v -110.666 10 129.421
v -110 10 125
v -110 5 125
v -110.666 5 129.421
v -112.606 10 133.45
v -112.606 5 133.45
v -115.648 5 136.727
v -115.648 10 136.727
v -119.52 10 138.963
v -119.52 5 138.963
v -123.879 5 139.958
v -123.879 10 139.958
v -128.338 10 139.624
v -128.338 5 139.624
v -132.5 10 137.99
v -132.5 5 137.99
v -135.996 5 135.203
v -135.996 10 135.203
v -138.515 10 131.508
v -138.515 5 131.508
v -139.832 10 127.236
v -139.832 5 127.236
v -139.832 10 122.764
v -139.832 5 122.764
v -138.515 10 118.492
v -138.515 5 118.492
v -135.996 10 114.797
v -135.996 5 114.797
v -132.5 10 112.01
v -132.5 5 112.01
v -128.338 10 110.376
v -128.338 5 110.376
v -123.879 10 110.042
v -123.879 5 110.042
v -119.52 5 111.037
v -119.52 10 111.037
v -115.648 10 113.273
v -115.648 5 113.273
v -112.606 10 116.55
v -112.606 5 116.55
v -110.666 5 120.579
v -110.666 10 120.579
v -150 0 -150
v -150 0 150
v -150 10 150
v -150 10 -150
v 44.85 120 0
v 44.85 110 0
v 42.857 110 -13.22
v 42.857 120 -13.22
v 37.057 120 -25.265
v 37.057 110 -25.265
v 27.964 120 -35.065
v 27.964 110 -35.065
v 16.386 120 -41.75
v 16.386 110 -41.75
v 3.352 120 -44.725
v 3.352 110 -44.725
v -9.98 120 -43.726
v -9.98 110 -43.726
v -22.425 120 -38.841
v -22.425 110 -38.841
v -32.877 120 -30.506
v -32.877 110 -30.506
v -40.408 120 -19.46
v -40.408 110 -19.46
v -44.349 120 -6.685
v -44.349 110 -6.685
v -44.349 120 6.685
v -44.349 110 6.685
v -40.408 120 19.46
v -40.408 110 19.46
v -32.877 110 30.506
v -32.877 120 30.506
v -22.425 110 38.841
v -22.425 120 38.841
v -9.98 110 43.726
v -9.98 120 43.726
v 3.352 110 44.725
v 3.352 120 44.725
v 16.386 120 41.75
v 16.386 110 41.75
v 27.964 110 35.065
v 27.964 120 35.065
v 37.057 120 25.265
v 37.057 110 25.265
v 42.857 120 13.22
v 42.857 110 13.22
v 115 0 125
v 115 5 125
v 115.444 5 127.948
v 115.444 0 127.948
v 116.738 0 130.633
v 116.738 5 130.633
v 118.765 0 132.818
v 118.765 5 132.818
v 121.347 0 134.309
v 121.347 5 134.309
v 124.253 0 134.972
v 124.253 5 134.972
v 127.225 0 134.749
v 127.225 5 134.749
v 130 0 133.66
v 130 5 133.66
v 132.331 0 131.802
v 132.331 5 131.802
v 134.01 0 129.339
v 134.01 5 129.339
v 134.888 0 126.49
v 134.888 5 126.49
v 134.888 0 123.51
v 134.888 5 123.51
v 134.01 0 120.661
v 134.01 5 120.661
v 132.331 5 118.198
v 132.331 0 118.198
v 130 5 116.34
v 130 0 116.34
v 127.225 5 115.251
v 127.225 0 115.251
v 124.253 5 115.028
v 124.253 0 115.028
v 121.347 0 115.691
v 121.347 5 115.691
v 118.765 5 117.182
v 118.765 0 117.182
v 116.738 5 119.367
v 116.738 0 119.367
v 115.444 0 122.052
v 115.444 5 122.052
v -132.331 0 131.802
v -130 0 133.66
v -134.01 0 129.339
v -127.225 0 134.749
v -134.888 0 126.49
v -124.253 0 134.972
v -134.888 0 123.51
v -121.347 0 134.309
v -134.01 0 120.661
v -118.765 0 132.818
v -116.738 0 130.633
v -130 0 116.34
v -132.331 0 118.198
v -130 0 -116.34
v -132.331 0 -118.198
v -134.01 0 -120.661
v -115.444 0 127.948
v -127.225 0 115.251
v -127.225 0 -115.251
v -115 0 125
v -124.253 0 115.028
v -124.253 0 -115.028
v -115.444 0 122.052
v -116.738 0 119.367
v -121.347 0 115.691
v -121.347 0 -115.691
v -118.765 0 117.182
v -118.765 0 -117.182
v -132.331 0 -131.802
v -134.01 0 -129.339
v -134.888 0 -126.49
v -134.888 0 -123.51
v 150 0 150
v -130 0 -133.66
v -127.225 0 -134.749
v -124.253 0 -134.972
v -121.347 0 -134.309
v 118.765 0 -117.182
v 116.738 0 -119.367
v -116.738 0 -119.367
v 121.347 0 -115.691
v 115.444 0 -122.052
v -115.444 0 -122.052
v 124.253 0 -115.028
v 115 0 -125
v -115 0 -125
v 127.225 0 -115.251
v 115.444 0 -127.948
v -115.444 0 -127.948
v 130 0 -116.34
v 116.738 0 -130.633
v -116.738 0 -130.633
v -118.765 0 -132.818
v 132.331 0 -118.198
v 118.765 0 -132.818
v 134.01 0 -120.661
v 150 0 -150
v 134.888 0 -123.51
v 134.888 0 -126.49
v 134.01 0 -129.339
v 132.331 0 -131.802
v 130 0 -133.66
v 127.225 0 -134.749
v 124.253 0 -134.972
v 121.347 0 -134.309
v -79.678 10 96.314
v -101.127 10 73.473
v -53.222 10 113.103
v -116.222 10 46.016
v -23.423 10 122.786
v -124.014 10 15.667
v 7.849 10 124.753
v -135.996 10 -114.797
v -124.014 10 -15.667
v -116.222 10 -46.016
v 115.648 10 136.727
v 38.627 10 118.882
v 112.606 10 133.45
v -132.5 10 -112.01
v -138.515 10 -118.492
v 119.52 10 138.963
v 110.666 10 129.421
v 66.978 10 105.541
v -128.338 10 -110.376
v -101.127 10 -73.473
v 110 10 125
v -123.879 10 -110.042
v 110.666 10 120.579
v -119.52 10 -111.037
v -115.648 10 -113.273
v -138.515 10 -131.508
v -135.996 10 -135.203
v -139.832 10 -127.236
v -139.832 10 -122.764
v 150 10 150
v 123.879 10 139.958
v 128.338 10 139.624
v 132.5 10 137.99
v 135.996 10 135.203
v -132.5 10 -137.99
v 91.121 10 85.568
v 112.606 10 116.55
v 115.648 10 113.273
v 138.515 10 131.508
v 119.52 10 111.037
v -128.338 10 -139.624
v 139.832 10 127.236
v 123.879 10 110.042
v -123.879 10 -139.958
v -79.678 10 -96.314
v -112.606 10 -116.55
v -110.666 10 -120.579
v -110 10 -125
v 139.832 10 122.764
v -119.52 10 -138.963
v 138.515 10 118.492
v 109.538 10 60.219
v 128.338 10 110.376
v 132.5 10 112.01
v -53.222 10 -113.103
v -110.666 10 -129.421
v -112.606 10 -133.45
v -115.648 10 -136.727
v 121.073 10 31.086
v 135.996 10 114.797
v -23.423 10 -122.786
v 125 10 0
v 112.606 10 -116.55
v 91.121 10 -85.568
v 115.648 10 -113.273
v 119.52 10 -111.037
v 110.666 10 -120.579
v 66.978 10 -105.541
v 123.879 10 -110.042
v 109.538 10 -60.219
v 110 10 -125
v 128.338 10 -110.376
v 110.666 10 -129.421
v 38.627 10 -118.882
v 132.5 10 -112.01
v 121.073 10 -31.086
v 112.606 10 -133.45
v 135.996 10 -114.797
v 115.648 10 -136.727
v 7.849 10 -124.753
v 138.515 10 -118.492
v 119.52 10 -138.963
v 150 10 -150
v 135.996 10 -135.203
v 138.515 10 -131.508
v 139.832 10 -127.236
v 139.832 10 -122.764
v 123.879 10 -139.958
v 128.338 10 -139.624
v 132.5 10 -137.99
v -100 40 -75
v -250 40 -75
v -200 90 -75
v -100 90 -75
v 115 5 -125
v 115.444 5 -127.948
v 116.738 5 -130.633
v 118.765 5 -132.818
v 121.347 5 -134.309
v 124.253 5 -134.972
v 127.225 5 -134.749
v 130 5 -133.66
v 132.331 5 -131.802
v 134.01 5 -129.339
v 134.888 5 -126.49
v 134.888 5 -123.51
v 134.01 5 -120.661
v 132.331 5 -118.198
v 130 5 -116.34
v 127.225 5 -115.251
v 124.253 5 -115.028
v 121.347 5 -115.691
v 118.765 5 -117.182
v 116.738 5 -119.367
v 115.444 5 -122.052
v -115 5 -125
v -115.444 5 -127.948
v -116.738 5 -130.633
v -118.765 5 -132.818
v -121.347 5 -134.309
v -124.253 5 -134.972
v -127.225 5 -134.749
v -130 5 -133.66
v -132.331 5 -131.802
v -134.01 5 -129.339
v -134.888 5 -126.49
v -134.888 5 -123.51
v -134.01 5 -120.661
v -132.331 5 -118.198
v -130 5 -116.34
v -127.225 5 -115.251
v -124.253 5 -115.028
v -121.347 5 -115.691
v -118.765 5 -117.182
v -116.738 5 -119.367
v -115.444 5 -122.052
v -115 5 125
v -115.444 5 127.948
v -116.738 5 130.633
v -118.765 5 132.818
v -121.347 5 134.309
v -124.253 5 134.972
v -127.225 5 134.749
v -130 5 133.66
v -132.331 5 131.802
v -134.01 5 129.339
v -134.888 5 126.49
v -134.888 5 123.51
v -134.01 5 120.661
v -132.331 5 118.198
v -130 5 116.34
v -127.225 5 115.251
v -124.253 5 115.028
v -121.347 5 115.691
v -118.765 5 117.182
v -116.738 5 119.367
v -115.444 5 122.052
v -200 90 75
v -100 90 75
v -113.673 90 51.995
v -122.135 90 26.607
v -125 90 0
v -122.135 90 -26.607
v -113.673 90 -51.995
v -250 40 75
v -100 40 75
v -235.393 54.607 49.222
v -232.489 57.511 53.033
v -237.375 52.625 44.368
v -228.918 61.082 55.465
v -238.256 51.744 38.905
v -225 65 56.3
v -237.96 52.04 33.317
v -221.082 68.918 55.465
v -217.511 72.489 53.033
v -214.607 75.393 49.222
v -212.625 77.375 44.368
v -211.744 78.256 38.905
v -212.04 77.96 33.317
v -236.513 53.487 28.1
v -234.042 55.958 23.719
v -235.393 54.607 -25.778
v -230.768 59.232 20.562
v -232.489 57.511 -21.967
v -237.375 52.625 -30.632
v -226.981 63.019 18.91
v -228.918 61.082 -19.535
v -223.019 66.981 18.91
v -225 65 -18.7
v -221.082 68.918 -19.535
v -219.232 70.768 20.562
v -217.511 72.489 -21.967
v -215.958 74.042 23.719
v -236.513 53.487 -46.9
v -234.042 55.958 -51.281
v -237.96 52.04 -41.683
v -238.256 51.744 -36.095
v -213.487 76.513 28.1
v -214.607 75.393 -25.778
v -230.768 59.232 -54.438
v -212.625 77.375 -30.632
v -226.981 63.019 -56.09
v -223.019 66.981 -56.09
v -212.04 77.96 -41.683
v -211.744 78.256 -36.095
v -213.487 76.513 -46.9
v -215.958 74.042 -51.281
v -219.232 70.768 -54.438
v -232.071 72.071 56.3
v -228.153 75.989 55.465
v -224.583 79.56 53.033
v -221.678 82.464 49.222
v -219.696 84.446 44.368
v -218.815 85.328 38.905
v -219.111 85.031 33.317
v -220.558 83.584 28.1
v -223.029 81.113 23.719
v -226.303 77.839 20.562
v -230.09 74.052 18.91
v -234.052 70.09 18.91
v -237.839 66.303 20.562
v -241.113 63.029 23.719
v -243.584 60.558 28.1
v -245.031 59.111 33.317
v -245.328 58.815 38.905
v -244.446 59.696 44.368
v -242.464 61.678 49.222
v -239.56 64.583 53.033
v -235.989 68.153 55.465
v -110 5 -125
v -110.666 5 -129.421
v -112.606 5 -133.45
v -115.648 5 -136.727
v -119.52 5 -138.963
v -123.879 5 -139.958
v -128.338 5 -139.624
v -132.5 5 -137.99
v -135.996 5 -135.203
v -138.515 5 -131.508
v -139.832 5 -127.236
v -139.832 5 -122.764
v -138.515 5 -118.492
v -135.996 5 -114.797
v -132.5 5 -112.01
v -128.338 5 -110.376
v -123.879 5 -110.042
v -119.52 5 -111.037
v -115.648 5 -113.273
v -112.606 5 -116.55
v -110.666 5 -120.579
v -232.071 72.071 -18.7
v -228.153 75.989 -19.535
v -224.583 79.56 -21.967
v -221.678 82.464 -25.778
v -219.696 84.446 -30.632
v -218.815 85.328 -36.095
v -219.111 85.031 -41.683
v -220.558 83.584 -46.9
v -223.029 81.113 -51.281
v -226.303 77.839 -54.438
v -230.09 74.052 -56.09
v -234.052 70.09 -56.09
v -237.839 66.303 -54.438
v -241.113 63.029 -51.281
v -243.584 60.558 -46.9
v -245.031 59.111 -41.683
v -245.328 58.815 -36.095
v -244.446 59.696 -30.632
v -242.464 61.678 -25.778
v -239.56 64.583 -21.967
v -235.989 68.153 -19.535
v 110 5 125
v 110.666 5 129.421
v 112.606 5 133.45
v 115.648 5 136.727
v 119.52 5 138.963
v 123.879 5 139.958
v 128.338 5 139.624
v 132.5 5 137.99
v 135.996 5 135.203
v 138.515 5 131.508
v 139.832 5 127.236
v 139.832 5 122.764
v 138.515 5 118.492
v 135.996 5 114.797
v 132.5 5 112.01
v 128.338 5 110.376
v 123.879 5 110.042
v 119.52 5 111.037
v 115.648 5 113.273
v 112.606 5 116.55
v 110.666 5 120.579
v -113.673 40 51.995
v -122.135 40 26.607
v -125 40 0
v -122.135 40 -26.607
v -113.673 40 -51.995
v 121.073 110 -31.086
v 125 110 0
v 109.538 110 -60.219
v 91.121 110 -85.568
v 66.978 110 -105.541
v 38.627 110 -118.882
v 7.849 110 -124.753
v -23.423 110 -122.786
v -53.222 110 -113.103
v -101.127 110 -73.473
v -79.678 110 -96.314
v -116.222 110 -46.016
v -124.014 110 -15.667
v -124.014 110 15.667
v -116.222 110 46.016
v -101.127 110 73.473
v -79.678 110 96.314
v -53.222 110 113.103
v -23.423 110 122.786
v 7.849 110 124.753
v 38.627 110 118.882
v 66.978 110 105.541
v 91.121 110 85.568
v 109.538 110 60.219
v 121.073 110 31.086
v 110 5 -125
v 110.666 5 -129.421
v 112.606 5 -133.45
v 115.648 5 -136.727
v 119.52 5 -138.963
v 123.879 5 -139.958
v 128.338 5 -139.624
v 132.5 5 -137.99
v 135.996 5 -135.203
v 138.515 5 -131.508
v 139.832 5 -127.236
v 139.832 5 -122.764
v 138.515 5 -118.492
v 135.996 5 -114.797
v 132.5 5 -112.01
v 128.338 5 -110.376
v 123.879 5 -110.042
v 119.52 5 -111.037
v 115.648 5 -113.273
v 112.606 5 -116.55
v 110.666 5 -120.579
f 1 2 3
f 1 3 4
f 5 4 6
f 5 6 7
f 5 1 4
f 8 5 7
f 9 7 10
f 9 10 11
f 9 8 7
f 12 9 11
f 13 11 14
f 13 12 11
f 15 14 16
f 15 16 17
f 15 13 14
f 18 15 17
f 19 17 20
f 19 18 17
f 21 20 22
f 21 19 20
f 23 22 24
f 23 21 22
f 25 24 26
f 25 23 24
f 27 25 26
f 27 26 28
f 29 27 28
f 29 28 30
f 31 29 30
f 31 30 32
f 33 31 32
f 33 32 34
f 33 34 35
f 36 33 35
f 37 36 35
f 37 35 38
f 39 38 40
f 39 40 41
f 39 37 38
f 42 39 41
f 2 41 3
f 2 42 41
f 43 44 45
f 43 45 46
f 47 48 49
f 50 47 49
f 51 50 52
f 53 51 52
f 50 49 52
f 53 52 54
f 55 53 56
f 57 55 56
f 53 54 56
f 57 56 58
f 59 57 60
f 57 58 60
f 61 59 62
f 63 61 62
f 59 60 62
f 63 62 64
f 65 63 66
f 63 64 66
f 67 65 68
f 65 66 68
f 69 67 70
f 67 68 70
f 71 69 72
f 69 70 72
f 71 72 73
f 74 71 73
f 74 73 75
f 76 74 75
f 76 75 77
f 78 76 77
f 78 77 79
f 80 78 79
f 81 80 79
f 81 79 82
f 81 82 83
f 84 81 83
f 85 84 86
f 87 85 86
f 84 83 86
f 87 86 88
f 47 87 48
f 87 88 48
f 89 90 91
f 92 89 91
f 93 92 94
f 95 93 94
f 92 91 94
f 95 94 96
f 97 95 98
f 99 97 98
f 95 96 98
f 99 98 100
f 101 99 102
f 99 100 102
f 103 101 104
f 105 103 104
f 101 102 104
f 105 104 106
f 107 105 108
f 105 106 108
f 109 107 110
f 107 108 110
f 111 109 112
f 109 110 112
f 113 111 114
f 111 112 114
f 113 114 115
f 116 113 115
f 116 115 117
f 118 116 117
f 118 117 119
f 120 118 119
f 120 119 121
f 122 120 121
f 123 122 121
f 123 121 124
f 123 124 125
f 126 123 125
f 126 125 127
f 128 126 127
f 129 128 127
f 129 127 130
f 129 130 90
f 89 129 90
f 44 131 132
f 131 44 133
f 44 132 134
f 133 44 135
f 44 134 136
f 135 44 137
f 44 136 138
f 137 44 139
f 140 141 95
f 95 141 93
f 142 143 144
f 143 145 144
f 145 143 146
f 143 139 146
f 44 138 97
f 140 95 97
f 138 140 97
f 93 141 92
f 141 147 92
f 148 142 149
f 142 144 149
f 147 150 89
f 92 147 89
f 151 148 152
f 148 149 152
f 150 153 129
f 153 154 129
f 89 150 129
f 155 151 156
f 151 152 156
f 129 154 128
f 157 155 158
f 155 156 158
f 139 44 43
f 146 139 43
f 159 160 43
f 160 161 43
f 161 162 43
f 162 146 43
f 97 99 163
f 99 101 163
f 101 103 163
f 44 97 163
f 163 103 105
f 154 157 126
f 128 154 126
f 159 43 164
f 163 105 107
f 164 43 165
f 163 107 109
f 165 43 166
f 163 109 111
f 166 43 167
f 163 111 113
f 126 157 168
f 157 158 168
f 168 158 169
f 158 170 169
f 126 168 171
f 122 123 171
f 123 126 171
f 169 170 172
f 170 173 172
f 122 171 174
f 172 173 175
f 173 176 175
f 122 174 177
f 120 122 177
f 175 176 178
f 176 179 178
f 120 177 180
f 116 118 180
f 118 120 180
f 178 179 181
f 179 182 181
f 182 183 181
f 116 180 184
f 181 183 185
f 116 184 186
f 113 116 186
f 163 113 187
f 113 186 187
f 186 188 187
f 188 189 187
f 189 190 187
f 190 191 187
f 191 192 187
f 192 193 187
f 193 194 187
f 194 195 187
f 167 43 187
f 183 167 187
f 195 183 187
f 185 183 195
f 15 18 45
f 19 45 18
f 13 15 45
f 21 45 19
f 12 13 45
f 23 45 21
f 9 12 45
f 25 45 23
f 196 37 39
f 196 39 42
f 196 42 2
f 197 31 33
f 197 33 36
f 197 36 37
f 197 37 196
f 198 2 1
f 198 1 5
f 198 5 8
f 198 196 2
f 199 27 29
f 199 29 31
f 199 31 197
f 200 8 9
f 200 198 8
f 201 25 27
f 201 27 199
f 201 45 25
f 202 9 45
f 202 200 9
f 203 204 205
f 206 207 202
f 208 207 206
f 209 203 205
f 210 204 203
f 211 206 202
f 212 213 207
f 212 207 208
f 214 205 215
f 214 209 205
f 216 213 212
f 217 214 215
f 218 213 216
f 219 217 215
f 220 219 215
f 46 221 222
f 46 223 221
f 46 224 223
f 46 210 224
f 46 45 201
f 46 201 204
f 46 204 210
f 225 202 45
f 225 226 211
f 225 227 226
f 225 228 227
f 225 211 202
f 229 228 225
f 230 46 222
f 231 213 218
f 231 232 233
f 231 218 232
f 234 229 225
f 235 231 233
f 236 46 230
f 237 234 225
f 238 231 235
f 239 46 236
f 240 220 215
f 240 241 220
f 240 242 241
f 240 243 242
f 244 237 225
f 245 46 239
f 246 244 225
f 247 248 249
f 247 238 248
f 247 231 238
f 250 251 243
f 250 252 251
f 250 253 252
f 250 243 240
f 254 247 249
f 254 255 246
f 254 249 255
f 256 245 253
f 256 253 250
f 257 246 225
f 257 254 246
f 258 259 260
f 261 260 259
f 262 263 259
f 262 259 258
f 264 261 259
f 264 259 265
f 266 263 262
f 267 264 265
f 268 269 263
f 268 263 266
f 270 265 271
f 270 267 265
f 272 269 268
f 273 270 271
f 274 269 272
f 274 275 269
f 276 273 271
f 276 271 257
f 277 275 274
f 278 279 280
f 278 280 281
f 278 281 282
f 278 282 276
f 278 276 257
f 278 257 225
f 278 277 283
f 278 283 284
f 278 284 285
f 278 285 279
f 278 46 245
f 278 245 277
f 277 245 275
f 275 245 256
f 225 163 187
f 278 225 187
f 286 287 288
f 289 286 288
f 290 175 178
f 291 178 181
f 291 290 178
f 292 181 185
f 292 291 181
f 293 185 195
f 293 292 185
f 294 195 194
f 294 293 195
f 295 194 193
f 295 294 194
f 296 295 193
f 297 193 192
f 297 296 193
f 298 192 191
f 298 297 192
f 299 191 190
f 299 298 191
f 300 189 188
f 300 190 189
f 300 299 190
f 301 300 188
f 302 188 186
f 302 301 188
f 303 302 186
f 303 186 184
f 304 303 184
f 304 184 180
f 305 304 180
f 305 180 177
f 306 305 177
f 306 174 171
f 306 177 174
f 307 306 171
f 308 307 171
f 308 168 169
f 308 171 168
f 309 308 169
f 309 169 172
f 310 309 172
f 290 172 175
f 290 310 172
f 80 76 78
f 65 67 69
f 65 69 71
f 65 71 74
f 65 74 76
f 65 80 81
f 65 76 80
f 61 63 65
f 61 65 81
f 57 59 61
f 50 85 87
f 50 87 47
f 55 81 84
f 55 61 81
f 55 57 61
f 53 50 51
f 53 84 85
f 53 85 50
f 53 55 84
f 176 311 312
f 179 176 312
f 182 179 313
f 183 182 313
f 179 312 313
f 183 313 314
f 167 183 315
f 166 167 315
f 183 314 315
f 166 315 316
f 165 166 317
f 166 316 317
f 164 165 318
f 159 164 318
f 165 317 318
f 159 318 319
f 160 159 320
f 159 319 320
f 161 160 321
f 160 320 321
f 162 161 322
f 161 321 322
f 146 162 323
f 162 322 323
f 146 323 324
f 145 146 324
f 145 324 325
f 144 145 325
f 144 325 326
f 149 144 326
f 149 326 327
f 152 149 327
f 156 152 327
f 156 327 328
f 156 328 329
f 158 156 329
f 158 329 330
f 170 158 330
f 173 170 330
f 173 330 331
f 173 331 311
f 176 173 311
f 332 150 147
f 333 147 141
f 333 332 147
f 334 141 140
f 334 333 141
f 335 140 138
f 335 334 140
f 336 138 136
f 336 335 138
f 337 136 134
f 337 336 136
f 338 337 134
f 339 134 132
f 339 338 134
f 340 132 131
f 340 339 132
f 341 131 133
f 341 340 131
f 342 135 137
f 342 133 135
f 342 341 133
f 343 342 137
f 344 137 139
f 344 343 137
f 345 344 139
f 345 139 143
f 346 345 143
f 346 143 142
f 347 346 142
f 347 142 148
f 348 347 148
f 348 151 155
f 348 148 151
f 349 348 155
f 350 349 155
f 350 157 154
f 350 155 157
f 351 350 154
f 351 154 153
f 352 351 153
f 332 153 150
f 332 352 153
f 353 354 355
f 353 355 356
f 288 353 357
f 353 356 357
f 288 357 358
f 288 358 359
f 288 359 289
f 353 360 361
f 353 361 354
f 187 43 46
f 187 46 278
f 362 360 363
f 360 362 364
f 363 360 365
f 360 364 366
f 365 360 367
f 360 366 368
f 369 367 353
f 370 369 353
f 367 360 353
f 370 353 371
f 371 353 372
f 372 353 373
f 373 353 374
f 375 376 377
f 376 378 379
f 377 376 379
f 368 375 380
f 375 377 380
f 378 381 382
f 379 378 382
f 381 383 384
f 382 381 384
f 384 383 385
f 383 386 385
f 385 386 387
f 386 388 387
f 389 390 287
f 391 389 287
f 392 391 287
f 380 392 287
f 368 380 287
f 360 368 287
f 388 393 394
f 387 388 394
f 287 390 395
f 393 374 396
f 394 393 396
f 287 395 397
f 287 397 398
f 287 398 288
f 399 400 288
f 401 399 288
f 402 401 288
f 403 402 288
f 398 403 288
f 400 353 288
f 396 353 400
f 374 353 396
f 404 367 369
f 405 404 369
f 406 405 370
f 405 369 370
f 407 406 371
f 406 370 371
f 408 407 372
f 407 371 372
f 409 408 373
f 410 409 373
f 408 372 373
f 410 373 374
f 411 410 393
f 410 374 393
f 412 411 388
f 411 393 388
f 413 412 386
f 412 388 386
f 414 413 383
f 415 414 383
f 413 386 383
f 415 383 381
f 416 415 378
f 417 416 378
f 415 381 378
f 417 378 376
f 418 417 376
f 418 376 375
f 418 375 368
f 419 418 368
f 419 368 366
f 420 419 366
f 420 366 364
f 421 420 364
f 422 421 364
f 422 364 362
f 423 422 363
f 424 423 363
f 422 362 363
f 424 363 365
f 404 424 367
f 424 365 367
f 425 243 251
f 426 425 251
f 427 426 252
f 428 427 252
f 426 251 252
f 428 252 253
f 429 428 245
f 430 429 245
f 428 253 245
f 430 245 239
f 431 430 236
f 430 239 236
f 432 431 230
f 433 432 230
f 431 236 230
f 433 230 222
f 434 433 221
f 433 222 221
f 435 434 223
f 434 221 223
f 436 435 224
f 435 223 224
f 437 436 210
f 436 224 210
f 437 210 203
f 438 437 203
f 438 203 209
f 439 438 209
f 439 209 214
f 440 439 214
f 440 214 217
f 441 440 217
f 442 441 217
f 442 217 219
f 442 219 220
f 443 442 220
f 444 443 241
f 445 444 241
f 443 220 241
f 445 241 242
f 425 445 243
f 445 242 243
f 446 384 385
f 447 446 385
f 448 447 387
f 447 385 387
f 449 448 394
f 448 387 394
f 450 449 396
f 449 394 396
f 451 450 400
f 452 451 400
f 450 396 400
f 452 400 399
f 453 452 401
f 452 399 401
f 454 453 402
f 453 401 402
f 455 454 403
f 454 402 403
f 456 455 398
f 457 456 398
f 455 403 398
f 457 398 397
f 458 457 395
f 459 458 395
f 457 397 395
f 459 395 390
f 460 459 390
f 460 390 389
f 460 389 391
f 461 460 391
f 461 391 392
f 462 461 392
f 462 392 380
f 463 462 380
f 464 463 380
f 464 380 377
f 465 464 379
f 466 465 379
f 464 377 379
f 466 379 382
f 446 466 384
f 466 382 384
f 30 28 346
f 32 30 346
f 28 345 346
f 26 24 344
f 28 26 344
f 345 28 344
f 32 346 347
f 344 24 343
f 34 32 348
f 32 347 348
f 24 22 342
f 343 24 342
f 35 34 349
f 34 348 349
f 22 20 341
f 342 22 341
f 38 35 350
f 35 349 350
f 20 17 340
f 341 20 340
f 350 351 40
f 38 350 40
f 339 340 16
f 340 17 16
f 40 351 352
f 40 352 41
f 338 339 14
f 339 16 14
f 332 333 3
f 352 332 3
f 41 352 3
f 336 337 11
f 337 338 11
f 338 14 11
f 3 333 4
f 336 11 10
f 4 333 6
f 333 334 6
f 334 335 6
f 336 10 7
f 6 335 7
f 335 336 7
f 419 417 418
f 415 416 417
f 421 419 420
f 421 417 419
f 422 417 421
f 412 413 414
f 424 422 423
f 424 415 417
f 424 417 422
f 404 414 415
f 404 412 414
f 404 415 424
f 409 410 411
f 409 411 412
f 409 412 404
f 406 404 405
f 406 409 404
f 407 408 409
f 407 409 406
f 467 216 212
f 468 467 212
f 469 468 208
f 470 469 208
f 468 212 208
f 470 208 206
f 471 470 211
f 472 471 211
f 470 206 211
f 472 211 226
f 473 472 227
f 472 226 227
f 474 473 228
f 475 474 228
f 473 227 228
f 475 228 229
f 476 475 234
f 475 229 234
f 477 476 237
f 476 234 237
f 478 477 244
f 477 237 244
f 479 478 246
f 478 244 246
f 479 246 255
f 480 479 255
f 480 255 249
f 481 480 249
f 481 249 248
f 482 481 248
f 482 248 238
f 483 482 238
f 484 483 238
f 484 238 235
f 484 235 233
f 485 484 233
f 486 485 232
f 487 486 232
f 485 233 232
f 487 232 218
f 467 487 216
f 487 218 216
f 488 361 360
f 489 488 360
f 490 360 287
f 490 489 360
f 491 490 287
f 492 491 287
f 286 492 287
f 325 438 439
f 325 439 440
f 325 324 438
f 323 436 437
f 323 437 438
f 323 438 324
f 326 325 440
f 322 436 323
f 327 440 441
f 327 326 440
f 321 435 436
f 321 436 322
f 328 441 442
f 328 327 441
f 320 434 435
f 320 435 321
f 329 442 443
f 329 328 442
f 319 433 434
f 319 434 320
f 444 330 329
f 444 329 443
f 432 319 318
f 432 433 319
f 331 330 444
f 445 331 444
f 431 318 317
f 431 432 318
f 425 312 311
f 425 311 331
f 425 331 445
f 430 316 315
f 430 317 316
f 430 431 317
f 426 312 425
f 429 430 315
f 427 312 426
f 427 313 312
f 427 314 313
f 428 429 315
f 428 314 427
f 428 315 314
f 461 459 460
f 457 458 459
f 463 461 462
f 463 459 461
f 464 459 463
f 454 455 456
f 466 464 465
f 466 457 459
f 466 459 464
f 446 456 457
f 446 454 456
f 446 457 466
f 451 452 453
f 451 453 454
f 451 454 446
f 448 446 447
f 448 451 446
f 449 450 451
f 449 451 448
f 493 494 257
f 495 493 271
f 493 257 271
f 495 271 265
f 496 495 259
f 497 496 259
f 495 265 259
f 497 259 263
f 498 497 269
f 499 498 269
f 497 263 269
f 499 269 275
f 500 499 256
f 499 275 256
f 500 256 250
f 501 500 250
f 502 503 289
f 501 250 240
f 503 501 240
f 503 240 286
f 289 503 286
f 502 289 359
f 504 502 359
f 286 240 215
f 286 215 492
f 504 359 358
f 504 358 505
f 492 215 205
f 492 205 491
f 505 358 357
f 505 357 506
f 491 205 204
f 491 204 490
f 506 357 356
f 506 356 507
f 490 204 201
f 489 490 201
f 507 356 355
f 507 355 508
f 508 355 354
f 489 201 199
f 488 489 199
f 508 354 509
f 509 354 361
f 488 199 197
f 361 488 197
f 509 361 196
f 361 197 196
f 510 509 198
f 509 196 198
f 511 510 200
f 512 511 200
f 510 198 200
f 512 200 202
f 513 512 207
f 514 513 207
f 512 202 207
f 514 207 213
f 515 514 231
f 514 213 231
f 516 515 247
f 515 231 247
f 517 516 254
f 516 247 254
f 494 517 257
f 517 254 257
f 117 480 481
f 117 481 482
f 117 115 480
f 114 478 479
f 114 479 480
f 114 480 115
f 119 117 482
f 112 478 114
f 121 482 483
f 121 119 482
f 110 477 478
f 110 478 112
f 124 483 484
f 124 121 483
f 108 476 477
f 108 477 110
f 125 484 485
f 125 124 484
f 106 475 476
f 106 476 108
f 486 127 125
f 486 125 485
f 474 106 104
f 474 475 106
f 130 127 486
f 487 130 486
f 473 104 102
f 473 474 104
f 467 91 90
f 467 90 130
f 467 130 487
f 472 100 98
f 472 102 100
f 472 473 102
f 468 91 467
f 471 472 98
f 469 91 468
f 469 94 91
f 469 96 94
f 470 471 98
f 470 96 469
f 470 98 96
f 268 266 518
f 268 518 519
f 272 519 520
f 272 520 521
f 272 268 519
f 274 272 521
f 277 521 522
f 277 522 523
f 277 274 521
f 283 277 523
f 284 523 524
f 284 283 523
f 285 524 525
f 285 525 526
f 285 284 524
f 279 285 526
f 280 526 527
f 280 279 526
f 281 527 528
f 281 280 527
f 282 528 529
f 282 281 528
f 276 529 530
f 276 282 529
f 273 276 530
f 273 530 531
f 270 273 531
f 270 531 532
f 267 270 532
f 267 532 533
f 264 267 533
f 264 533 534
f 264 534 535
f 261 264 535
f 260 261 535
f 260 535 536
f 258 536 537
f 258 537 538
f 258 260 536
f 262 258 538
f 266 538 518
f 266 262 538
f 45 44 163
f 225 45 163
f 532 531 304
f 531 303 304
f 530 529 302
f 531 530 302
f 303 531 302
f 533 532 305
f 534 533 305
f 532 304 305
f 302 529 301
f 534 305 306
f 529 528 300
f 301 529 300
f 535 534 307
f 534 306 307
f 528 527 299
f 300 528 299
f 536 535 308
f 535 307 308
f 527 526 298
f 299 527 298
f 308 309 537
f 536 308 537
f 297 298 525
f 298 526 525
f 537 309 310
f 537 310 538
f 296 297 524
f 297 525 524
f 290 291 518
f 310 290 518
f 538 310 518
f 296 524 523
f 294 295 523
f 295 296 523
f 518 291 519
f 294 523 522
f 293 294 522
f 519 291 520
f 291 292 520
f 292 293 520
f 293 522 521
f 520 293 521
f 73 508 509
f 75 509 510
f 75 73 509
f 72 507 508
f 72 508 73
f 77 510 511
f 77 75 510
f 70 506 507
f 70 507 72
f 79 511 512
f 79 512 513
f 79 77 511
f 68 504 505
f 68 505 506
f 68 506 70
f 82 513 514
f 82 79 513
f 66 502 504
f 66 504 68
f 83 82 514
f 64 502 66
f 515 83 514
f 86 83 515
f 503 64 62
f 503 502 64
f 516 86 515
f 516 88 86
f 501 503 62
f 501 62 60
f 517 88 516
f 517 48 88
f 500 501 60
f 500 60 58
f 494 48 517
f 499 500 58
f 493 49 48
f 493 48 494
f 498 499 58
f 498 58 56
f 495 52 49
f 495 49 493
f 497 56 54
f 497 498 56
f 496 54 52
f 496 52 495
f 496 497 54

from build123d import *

# Parameters (mm, degrees)
SKETCH_1_W               = 300
SKETCH_1_H               = 300
EXTRUDE_1_DEPTH          = 10
SKETCH_2_R               = 125
EXTRUDE_2_DEPTH          = 100
SKETCH_3_W               = 150
SKETCH_3_H               = 50
EXTRUDE_3_DEPTH          = 200
DRAFT_3_ANGLE            = 45
SKETCH_5_R               = 18.8
EXTRUDE_5_DEPTH          = 10
SKETCH_6_R               = 44.85
EXTRUDE_6_DEPTH          = 10
SKETCH_7_R               = 15
CUT_EXTRUDE_1_DEPTH      = 5
SKETCH_8_R               = 10
CUT_EXTRUDE_2_DEPTH      = 25
MIRROR_2_COPY_1_SKETCH_R = 15
MIRROR_2_COPY_1_DEPTH    = 5
MIRROR_2_COPY_2_SKETCH_R = 10
MIRROR_2_COPY_2_DEPTH    = 25


with BuildPart() as part:
    # 草图1 → 凸台-拉伸1 (new body)
    with BuildSketch(Plane(origin=(0, 0, 0), x_dir=(1, 0, 0), z_dir=(0, 1, 0))):
        Rectangle(SKETCH_1_W, SKETCH_1_H)
    extrude(amount=EXTRUDE_1_DEPTH)

    # 草图2 → 凸台-拉伸2 (add)
    with BuildSketch(Plane(origin=(0, 10, 0), x_dir=(1, 0, 0), z_dir=(0, 1, 0))):
        Circle(SKETCH_2_R)
    extrude(amount=EXTRUDE_2_DEPTH)

    # 草图3 → 凸台-拉伸3 (add)
    with BuildSketch(Plane(origin=(0, 0, 0), x_dir=(0, 0, -1), z_dir=(1, 0, 0))):
        with Locations((0, 65)):
            Rectangle(SKETCH_3_W, SKETCH_3_H)
    extrude(amount=-EXTRUDE_3_DEPTH)

    # 拔模3
    draft_3_faces = [part.faces().sort_by_distance(p)[0] for p in [
        (-200, 65, 0),
    ]]
    draft(draft_3_faces, Plane(origin=(-200, 90, 75), x_dir=(0, 0, 1), z_dir=(0, 1, 0)), DRAFT_3_ANGLE)

    # 草图5 → 凸台-拉伸5 (add)
    with BuildSketch(Plane(origin=(-145, 145, 0), x_dir=(0, 0, 1), z_dir=(-0.707106781, 0.707106781, 0))):
        with Locations((-37.5, -113.13708499)):
            Circle(SKETCH_5_R)
        with Locations((37.5, -113.13708499)):
            Circle(SKETCH_5_R)
    extrude(amount=EXTRUDE_5_DEPTH)

    # 草图6 → 凸台-拉伸6 (add)
    with BuildSketch(Plane(origin=(0, 110, 0), x_dir=(1, 0, 0), z_dir=(0, 1, 0))):
        Circle(SKETCH_6_R)
    extrude(amount=EXTRUDE_6_DEPTH)

    # 草图7 → 切除-拉伸1 (cut)
    with BuildSketch(Plane(origin=(0, 10, 0), x_dir=(1, 0, 0), z_dir=(0, 1, 0))):
        with Locations((-125, 125)):
            Circle(SKETCH_7_R)
    cut_extrude_1 = extrude(amount=-CUT_EXTRUDE_1_DEPTH, mode=Mode.SUBTRACT)

    # 草图8 → 切除-拉伸2 (cut)
    with BuildSketch(Plane(origin=(0, 5, 0), x_dir=(1, 0, 0), z_dir=(0, 1, 0))):
        with Locations((-125, 125)):
            Circle(SKETCH_8_R)
    cut_extrude_2 = extrude(amount=-CUT_EXTRUDE_2_DEPTH, mode=Mode.SUBTRACT)

    # 镜向1: 切除-拉伸1, 切除-拉伸2 across plane
    add(cut_extrude_1.mirror(Plane.XY), mode=Mode.SUBTRACT)
    add(cut_extrude_2.mirror(Plane.XY), mode=Mode.SUBTRACT)

    # 镜向2: 切除-拉伸1, 切除-拉伸2 across plane
    add(cut_extrude_1.mirror(Plane(origin=(0, 0, 0), x_dir=(0, 0, 1), z_dir=(1, 0, 0))), mode=Mode.SUBTRACT)
    add(cut_extrude_2.mirror(Plane(origin=(0, 0, 0), x_dir=(0, 0, 1), z_dir=(1, 0, 0))), mode=Mode.SUBTRACT)

    # 镜向2 copy 1 sketch → 镜向2 copy 1 (cut)
    with BuildSketch(Plane(origin=(0, 10, 0), x_dir=(-1, 0, 0), z_dir=(0, 1, 0))):
        with Locations((-125, 125)):
            Circle(MIRROR_2_COPY_1_SKETCH_R)
    extrude(amount=-MIRROR_2_COPY_1_DEPTH, mode=Mode.SUBTRACT)

    # 镜向2 copy 2 sketch → 镜向2 copy 2 (cut)
    with BuildSketch(Plane(origin=(0, 5, 0), x_dir=(-1, 0, 0), z_dir=(0, 1, 0))):
        with Locations((-125, 125)):
            Circle(MIRROR_2_COPY_2_SKETCH_R)
    extrude(amount=-MIRROR_2_COPY_2_DEPTH, mode=Mode.SUBTRACT)


solid = part.part
